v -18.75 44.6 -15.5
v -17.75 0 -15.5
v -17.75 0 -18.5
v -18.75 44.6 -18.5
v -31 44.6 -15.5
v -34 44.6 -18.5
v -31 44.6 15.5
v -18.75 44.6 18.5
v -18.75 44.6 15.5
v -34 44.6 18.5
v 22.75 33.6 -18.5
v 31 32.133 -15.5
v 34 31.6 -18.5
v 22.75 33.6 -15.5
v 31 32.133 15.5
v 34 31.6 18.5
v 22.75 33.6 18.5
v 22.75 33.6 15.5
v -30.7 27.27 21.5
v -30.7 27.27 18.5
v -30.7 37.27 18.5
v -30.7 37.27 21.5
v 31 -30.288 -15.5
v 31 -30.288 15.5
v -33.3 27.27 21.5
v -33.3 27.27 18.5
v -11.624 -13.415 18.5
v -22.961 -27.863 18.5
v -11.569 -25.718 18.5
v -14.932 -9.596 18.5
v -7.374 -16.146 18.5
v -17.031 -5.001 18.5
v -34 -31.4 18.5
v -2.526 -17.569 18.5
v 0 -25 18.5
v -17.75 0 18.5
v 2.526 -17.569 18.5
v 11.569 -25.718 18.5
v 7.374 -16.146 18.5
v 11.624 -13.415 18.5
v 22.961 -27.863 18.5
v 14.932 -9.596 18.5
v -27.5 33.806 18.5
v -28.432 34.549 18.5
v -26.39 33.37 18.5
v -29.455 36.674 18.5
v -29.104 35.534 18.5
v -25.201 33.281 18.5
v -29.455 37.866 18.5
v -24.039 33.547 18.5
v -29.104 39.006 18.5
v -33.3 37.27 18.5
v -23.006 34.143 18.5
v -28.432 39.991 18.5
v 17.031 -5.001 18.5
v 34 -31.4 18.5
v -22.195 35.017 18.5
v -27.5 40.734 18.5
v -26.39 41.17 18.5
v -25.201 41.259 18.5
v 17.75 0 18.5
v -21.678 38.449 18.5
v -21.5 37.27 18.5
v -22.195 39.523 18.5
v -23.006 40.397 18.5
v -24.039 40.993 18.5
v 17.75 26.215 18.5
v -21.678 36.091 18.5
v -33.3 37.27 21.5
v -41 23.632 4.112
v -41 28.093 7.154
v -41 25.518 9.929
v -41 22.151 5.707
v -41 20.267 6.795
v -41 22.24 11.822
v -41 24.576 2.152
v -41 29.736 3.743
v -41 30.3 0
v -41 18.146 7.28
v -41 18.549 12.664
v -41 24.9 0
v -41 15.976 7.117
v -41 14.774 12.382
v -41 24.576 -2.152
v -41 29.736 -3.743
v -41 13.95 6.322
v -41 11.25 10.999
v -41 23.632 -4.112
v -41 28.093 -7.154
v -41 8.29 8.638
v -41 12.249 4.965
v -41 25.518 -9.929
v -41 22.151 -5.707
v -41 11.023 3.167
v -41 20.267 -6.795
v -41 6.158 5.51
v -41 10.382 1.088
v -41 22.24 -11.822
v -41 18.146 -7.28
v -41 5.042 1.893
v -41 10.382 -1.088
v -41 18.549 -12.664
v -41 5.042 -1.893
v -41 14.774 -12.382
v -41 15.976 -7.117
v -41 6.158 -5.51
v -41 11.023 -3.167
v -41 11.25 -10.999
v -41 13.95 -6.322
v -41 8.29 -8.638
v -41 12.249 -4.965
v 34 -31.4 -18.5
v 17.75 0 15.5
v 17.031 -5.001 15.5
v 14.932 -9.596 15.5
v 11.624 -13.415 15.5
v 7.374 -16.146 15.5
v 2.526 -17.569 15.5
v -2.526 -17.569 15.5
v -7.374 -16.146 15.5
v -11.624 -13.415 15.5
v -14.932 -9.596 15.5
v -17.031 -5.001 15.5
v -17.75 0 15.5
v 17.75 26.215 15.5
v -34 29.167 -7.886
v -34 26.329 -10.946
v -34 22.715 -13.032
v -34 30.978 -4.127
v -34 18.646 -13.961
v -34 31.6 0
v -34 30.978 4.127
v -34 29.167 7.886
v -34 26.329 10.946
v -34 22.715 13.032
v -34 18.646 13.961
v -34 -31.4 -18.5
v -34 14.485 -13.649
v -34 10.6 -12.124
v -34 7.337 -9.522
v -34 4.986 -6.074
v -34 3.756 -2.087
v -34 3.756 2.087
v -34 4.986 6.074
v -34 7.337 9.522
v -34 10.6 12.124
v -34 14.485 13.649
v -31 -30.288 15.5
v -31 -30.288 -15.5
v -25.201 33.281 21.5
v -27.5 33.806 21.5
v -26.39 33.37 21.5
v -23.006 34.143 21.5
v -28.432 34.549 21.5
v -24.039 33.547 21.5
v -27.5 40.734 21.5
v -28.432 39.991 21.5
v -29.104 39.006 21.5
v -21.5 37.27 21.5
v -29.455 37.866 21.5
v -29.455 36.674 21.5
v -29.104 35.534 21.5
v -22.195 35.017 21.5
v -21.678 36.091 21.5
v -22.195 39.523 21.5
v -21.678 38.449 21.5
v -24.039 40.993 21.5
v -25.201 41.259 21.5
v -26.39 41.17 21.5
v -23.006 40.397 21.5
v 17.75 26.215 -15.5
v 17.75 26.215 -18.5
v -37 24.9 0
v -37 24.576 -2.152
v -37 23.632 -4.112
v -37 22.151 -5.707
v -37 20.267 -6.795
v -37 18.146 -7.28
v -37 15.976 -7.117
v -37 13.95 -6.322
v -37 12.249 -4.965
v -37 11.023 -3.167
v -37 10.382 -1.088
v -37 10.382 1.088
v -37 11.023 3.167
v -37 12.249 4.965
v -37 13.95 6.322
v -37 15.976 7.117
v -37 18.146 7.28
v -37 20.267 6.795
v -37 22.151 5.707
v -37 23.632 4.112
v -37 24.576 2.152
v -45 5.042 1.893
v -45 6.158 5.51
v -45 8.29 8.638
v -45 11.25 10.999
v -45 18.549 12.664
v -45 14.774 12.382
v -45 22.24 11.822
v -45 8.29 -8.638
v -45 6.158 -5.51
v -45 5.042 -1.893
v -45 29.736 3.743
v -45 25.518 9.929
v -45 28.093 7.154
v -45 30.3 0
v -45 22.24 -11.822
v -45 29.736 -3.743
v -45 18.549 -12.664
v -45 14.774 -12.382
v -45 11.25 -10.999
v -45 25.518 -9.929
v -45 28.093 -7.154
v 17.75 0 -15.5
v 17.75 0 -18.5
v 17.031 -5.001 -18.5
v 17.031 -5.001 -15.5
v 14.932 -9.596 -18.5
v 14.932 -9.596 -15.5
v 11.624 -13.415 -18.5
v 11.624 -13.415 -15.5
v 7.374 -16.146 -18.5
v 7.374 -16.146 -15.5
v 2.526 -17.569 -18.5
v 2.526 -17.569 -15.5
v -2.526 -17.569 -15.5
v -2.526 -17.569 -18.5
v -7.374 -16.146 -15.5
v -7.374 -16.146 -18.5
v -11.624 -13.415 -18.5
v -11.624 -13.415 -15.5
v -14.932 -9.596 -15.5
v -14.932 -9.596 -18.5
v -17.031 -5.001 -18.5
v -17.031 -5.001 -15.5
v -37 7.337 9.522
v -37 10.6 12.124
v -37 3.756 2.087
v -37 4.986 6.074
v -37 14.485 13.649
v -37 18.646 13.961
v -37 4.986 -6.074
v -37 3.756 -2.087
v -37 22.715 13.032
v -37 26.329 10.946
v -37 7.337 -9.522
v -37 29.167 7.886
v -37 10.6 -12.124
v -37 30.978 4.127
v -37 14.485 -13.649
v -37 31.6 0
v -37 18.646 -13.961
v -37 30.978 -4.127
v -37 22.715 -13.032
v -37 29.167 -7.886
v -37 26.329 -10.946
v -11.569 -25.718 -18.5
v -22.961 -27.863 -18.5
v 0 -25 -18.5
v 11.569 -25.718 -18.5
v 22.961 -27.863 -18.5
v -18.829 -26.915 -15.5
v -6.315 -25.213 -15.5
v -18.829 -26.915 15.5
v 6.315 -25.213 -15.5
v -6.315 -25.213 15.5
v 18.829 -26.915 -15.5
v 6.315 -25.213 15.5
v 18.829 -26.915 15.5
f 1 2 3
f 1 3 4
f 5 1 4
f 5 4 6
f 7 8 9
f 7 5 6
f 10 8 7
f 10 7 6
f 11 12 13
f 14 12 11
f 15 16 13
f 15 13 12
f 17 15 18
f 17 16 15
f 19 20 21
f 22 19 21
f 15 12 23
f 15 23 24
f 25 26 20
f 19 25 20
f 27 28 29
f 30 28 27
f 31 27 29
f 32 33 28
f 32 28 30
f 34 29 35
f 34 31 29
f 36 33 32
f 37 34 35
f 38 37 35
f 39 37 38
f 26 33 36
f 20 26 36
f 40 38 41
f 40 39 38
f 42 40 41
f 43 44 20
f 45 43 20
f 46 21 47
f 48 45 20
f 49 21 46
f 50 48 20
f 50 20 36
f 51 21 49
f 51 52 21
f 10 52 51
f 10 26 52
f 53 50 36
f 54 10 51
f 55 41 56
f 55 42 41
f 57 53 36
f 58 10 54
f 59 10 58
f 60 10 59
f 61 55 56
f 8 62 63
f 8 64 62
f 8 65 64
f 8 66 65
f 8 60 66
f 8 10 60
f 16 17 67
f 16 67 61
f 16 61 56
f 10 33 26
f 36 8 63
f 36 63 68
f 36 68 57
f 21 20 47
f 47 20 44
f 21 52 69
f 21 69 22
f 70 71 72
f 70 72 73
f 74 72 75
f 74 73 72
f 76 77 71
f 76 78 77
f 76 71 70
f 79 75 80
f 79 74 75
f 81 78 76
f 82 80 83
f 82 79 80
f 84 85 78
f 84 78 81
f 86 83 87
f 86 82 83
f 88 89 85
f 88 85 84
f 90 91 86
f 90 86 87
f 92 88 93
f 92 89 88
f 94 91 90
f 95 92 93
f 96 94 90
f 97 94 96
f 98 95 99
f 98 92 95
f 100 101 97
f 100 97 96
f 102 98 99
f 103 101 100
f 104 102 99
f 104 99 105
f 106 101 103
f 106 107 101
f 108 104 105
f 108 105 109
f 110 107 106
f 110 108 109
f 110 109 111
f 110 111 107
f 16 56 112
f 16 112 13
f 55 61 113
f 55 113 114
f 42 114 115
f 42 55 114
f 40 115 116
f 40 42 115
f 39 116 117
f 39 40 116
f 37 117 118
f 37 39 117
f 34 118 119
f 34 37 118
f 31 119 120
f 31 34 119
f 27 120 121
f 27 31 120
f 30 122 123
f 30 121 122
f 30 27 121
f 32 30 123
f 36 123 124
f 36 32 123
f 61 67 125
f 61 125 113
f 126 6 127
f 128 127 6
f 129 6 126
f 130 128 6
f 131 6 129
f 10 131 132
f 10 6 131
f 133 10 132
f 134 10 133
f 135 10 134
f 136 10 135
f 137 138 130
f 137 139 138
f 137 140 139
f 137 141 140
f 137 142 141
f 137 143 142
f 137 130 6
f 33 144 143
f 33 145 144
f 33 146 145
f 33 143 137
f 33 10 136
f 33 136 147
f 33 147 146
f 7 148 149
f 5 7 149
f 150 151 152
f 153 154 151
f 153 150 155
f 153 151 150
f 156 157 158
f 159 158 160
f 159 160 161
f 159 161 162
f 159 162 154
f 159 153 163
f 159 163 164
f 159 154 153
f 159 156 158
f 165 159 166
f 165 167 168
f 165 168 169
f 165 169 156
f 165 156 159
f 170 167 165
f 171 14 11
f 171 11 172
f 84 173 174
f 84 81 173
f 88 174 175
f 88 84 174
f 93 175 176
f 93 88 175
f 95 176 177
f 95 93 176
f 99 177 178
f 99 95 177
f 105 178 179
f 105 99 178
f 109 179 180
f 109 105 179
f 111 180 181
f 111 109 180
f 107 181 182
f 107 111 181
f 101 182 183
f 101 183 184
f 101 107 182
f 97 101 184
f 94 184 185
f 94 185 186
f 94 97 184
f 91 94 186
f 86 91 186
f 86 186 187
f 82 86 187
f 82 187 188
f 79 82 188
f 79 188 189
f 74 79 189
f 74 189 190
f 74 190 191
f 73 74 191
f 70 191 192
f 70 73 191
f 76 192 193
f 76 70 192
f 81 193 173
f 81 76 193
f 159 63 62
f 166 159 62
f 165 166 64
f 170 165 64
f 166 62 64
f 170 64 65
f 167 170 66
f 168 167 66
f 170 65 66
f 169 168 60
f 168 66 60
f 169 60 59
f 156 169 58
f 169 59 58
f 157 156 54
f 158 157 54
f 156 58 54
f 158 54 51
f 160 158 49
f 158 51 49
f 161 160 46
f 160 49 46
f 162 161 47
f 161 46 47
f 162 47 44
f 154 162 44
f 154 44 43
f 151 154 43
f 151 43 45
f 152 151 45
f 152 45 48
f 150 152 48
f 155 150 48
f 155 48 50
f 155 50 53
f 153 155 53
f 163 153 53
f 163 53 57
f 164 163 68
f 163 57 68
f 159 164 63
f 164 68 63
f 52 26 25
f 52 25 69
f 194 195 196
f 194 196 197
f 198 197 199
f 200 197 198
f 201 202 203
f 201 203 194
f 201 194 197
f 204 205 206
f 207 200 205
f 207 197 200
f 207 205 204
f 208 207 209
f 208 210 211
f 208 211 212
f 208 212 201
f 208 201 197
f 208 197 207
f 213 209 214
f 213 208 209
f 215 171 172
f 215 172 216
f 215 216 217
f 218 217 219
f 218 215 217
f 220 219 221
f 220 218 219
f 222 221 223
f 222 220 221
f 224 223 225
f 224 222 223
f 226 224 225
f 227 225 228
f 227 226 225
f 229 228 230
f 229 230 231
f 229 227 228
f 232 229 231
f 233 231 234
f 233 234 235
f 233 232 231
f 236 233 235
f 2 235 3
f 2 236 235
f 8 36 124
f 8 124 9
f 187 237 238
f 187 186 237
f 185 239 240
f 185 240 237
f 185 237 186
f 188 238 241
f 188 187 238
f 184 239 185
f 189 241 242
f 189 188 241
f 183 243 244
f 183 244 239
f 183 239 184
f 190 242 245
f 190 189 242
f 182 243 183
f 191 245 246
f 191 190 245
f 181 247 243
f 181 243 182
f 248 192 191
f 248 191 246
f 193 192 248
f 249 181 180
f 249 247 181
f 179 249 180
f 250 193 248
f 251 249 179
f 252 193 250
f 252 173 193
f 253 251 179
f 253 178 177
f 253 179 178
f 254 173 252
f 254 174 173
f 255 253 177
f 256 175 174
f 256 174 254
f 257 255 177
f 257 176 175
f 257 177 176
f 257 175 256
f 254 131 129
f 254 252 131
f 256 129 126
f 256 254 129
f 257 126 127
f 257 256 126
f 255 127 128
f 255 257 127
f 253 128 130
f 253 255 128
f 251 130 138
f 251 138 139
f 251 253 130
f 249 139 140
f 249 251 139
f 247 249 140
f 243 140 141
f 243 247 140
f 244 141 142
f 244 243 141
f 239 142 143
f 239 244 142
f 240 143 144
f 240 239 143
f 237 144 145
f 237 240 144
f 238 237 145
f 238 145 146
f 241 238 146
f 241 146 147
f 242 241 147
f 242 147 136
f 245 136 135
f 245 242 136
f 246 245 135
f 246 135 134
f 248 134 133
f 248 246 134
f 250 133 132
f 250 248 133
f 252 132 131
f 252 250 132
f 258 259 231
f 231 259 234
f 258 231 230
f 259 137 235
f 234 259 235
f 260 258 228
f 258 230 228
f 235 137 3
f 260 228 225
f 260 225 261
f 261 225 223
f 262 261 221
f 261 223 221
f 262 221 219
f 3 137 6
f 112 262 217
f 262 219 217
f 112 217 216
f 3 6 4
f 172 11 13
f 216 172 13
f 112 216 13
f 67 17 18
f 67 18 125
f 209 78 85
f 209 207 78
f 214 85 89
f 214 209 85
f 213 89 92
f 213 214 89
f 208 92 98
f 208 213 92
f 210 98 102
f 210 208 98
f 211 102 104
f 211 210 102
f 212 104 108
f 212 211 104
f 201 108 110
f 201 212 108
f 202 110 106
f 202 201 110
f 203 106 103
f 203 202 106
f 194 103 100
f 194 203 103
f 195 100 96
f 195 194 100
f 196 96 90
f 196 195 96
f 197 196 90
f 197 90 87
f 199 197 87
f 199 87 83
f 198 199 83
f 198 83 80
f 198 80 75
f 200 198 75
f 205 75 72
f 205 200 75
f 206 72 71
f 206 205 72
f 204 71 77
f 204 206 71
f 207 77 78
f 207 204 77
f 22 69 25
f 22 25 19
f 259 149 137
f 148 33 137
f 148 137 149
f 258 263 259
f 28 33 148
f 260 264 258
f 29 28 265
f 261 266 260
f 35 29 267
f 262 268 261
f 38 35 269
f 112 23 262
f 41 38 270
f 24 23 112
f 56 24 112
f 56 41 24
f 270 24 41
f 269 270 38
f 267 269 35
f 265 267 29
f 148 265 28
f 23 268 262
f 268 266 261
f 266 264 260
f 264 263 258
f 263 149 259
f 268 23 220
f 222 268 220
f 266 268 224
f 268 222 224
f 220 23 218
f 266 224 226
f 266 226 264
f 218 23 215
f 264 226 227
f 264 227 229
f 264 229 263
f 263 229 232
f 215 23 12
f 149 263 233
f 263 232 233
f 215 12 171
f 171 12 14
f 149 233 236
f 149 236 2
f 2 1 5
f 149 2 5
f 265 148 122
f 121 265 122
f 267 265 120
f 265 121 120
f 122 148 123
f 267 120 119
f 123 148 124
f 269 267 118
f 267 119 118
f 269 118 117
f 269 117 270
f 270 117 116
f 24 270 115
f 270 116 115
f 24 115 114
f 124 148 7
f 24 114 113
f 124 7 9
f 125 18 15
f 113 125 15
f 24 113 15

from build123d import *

# Parameters (mm, degrees)
SALIENTE_EXTRUIR1_DEPTH = 18.5
CORTAR_EXTRUIR1_DEPTH   = 53.5
CROQUIS4_R              = 4
CROQUIS4_W              = 2.6
CROQUIS4_H              = 10
SALIENTE_EXTRUIR3_DEPTH = 3


with BuildPart() as part:
    # Croquis1 → Saliente-Extruir1 (new, symmetric)
    with BuildSketch(Plane.XY):
        with BuildLine():
            Line((-34, 44.6), (-34, -31.4))
            ThreePointArc((-34, -31.4), (0, -25), (34, -31.4))
            Line((34, -31.4), (34, 31.6))
            Line((34, 31.6), (22.75, 33.6))
            Line((22.75, 33.6), (17.75, 26.215384615))
            Line((17.75, 26.215384615), (17.75, 0))
            ThreePointArc((17.75, 0), (0, -17.75), (-17.75, 0))
            Line((-17.75, 0), (-18.75, 44.6))
            Line((-18.75, 44.6), (-34, 44.6))
        make_face()
    extrude(amount=SALIENTE_EXTRUIR1_DEPTH, both=True)

    # Croquis2 → Cortar-Extruir1 (cut, symmetric)
    with BuildSketch(Plane(origin=(0, 0, 0), x_dir=(1, 0, 0), z_dir=(0, 1, 0))):
        Polygon((-18.75, -15.5), (-31, -15.5), (-31, 15.5), (-18.75, 15.5), (-17.75, 15.5), (17.75, 15.5), (22.75, 15.5), (31, 15.5), (31, -15.5), (22.75, -15.5), (17.75, -15.5), (-17.75, -15.5), align=None)
    extrude(amount=CORTAR_EXTRUIR1_DEPTH, both=True, mode=Mode.SUBTRACT)

    # Croquis3 → Revolución1 (revolve)
    with BuildSketch(Plane.XY, mode=Mode.PRIVATE) as revoluci_n1_sk:
        Polygon((-34, 17.6), (-34, 3.6), (-37, 3.6), (-37, 10.3), (-41, 10.3), (-41, 4.9), (-45, 4.9), (-45, 17.6), align=None)
    revolve(revoluci_n1_sk.sketch.rotate(Axis((19.47822933, 17.6, 0), (-1, 0, 0)), 180), axis=Axis((19.47822933, 17.6, 0), (-1, 0, 0)))

    # Croquis4 → Saliente-Extruir3 (add)
    with BuildSketch(Plane.XY.offset(18.5)):
        with Locations((-25.5, 37.27)):
            Circle(CROQUIS4_R)
        with Locations((-32, 32.27)):
            Rectangle(CROQUIS4_W, CROQUIS4_H)
    extrude(amount=SALIENTE_EXTRUIR3_DEPTH)


solid = part.part
